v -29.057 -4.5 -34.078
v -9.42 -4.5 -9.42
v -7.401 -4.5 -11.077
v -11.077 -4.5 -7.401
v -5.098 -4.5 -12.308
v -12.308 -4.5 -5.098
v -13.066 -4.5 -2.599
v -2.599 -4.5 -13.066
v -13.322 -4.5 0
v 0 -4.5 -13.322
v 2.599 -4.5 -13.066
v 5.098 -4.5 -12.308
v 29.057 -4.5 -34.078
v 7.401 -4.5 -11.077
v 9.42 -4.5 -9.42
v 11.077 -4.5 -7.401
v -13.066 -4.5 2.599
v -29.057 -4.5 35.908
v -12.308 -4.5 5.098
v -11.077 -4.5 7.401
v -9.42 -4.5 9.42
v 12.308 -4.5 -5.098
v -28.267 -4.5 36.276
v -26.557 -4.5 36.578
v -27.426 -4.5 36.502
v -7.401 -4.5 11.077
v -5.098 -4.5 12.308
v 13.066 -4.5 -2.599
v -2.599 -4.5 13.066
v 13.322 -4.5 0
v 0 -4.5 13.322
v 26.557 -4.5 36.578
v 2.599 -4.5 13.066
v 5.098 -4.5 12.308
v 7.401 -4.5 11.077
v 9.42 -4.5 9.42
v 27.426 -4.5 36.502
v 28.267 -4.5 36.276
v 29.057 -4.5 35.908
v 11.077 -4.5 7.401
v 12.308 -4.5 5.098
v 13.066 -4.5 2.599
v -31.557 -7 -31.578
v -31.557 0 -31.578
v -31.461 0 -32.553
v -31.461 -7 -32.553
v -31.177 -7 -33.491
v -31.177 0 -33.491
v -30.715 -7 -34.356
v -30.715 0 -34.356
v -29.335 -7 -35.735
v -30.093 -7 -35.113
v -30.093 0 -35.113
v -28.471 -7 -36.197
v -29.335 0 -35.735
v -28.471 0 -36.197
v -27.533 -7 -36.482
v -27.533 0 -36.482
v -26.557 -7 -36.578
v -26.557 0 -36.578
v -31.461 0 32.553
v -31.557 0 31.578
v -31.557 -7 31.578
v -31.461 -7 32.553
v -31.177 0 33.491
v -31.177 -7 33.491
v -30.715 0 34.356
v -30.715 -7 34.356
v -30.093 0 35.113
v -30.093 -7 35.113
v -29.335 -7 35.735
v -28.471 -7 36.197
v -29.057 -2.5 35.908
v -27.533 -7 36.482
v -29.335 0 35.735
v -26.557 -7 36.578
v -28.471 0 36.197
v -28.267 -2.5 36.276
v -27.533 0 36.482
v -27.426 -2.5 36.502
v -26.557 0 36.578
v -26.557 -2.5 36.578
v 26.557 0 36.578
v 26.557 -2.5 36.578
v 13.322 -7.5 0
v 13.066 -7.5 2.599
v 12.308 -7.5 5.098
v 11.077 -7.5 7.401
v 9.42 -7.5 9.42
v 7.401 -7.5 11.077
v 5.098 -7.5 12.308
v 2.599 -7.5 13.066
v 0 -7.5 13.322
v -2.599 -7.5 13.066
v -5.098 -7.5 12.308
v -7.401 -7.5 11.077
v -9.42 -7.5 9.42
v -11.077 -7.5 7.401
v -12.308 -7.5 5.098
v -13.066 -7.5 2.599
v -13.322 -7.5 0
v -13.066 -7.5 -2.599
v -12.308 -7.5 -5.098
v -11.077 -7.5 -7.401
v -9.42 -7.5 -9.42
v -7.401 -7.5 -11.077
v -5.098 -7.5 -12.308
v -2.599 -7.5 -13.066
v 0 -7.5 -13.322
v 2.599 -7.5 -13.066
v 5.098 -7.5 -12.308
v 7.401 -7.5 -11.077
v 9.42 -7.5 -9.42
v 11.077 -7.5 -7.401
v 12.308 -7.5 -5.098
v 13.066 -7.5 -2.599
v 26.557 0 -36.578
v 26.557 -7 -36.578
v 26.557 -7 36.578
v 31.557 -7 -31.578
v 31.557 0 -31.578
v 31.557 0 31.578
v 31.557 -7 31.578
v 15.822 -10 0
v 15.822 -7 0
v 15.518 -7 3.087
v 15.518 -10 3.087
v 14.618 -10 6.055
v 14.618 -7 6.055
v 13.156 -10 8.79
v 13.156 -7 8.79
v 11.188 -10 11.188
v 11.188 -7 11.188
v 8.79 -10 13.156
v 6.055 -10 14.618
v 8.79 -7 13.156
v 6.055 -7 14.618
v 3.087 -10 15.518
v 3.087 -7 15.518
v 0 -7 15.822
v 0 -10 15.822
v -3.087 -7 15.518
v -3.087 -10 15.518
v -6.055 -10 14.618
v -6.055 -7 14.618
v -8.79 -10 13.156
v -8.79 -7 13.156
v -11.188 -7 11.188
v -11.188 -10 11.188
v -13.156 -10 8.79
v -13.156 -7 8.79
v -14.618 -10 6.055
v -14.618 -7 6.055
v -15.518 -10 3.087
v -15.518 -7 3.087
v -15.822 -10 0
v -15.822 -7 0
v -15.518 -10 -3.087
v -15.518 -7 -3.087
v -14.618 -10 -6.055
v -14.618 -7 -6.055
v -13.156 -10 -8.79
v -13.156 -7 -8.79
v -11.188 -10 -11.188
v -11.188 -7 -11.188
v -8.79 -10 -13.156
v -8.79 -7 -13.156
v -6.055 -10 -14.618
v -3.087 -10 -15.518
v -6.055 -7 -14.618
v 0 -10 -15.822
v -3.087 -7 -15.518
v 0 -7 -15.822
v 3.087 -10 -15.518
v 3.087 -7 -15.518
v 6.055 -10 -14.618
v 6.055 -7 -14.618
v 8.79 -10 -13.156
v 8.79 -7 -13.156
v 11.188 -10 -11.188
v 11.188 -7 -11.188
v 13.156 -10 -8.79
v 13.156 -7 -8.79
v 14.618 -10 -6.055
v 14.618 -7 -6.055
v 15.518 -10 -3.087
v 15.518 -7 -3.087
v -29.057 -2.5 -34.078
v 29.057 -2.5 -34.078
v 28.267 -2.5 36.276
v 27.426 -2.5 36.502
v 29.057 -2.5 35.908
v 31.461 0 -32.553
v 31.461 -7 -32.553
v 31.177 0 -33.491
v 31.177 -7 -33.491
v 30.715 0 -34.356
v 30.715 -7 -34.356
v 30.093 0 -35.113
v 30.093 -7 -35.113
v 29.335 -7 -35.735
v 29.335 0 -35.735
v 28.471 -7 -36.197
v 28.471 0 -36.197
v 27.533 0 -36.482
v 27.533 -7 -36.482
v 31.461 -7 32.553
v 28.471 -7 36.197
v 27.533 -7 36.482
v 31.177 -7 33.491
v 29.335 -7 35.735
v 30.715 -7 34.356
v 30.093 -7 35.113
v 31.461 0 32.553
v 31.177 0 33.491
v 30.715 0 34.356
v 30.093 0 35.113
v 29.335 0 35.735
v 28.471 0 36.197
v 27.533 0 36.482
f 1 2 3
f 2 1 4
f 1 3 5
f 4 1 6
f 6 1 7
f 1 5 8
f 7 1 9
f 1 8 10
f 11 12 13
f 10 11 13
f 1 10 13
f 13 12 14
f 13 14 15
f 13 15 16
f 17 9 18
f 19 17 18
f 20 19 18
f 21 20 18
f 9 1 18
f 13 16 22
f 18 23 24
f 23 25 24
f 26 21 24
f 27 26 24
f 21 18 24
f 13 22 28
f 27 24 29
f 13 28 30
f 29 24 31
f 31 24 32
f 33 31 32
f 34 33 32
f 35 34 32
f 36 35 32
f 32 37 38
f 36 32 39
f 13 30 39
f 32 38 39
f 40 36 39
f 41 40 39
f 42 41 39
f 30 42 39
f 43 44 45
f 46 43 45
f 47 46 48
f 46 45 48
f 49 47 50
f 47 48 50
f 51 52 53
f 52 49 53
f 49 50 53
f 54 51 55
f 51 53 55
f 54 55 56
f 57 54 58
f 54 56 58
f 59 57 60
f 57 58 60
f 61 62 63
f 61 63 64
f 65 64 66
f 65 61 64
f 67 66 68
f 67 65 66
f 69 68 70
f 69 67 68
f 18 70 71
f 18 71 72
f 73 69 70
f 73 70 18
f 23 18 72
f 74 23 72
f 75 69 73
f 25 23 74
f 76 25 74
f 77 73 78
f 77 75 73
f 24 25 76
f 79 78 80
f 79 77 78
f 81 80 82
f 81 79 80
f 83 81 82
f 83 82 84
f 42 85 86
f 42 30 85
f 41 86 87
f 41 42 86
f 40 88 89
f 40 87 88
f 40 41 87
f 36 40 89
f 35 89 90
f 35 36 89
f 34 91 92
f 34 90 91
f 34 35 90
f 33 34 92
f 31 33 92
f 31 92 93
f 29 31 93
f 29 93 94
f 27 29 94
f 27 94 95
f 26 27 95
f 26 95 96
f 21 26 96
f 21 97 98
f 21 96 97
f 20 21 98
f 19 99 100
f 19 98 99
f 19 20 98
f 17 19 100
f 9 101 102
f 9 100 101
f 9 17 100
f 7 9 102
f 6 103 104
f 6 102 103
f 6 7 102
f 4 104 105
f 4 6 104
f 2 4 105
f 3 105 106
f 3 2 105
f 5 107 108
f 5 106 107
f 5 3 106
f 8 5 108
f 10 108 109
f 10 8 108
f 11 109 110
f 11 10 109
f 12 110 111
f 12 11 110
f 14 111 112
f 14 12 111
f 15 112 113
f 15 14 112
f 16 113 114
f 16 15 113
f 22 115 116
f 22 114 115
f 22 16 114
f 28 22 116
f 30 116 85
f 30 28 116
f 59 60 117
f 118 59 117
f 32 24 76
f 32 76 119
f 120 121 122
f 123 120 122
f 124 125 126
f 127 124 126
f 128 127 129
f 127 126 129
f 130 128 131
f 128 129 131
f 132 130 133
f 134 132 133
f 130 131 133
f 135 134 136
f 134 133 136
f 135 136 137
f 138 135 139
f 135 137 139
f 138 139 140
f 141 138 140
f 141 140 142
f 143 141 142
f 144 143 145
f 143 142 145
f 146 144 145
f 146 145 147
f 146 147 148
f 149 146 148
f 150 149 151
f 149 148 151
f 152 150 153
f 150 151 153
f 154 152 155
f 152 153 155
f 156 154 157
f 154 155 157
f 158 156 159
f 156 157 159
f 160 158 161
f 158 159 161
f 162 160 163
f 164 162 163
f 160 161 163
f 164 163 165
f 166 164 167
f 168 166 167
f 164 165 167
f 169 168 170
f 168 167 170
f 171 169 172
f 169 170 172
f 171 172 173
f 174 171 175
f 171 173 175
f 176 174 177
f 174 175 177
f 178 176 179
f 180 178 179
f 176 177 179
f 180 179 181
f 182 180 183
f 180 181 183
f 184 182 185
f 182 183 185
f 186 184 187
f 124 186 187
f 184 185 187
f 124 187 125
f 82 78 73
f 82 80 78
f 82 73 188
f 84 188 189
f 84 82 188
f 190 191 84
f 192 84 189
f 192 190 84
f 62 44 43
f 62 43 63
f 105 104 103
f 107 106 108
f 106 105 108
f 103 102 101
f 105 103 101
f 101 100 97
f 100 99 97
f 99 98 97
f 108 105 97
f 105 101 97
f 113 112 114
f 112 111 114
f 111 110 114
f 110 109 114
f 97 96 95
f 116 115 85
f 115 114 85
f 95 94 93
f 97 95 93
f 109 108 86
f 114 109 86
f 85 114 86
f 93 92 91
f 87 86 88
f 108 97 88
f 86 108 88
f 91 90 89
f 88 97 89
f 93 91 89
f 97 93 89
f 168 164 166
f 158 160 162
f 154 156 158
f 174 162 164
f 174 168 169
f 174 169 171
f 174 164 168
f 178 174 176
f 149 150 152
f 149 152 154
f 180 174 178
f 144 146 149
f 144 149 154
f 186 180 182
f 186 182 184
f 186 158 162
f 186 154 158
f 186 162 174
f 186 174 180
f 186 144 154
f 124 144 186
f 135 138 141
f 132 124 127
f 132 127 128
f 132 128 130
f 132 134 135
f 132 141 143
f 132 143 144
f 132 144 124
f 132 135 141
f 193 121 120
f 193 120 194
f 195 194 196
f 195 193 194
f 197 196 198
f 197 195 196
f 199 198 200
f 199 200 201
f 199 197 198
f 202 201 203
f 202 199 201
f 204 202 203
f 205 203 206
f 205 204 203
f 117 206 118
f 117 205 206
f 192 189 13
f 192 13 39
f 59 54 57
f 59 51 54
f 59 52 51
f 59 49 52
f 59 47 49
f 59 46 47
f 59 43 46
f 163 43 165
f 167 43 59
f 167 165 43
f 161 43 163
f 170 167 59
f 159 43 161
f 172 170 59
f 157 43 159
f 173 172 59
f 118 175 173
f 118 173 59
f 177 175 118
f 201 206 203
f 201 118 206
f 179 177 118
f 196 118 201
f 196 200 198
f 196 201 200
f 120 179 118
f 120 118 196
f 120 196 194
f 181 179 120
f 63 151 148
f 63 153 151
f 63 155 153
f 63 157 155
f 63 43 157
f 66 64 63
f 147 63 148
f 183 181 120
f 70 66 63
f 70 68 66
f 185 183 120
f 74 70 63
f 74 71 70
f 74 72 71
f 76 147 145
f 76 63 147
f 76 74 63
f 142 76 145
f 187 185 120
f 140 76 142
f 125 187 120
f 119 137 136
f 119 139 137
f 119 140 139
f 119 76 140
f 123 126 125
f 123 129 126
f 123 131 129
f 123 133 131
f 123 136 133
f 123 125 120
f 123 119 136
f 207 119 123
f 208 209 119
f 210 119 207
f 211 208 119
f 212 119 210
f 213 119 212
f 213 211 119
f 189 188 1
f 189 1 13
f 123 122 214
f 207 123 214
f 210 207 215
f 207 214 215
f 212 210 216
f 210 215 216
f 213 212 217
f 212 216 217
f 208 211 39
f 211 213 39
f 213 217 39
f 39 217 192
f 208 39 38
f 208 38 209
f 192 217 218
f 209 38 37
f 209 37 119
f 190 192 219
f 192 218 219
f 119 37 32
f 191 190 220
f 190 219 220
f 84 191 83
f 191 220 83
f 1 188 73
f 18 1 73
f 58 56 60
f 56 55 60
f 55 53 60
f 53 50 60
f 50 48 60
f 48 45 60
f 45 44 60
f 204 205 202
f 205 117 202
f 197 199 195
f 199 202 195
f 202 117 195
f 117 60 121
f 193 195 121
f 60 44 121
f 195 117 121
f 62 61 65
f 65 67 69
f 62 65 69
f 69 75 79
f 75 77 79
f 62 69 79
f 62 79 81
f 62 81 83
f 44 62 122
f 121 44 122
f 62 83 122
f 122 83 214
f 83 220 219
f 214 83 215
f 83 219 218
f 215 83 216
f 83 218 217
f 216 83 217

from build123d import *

# Parameters (mm, degrees)
F0_W        = 63.1147548556
F0_H        = 73.1557384133
F1_DEPTH    = 7
F2_R        = 15.8223055834
F3_DEPTH    = 3
F4_T        = -2.5
F5_T1_DEPTH = 32


# Not quite as in the source:
# - a fillet or chamfer that OpenCascade refuses, or shapes differently, is made with other operations: its cross-section is extruded or revolved along the edge and cut away or added


with BuildPart() as f1:
    # F0 (on Front) → F1 (new body)
    with BuildSketch(Plane.XZ):
        Rectangle(F0_W, F0_H)
    extrude(amount=F1_DEPTH)

    # F2 (on face) → F3 (join)
    with BuildSketch(Plane.XZ.offset(7)):
        Circle(F2_R)
    extrude(amount=F3_DEPTH)

    # F4
    f4_openings = [f1.faces().sort_by_distance(p)[0] for p in [
        (0, -3.5, 36.577869),
    ]]
    offset(amount=F4_T, openings=f4_openings, kind=Kind.INTERSECTION)

    # F5: fillet of radius 5 on 4 edges, made by hand

    # F5_s2 → F5_t1 (cut)
    with BuildSketch(Plane.XZ.offset(-12.5)):
        with BuildLine():
            ThreePointArc((31.5573774278, 31.5778692067), (30.0929113337, 35.1134031126), (26.5573774278, 36.5778692067))
            Line((26.5573774278, 36.5778692067), (31.5573774278, 36.5778692067))
            Line((31.5573774278, 36.5778692067), (31.5573774278, 31.5778692067))
        make_face()
        with BuildLine():
            ThreePointArc((31.5573774278, -31.5778692067), (30.0929113337, -35.1134031126), (26.5573774278, -36.5778692067))
            Line((26.5573774278, -36.5778692067), (31.5573774278, -36.5778692067))
            Line((31.5573774278, -36.5778692067), (31.5573774278, -31.5778692067))
        make_face()
        with BuildLine():
            ThreePointArc((-31.5573774278, -31.5778692067), (-30.0929113337, -35.1134031126), (-26.5573774278, -36.5778692067))
            Line((-26.5573774278, -36.5778692067), (-31.5573774278, -36.5778692067))
            Line((-31.5573774278, -36.5778692067), (-31.5573774278, -31.5778692067))
        make_face()
        with BuildLine():
            ThreePointArc((-31.5573774278, 31.5778692067), (-30.0929113337, 35.1134031126), (-26.5573774278, 36.5778692067))
            Line((-26.5573774278, 36.5778692067), (-31.5573774278, 36.5778692067))
            Line((-31.5573774278, 36.5778692067), (-31.5573774278, 31.5778692067))
        make_face()
    extrude(amount=F5_T1_DEPTH, mode=Mode.SUBTRACT)


solid = f1.part
